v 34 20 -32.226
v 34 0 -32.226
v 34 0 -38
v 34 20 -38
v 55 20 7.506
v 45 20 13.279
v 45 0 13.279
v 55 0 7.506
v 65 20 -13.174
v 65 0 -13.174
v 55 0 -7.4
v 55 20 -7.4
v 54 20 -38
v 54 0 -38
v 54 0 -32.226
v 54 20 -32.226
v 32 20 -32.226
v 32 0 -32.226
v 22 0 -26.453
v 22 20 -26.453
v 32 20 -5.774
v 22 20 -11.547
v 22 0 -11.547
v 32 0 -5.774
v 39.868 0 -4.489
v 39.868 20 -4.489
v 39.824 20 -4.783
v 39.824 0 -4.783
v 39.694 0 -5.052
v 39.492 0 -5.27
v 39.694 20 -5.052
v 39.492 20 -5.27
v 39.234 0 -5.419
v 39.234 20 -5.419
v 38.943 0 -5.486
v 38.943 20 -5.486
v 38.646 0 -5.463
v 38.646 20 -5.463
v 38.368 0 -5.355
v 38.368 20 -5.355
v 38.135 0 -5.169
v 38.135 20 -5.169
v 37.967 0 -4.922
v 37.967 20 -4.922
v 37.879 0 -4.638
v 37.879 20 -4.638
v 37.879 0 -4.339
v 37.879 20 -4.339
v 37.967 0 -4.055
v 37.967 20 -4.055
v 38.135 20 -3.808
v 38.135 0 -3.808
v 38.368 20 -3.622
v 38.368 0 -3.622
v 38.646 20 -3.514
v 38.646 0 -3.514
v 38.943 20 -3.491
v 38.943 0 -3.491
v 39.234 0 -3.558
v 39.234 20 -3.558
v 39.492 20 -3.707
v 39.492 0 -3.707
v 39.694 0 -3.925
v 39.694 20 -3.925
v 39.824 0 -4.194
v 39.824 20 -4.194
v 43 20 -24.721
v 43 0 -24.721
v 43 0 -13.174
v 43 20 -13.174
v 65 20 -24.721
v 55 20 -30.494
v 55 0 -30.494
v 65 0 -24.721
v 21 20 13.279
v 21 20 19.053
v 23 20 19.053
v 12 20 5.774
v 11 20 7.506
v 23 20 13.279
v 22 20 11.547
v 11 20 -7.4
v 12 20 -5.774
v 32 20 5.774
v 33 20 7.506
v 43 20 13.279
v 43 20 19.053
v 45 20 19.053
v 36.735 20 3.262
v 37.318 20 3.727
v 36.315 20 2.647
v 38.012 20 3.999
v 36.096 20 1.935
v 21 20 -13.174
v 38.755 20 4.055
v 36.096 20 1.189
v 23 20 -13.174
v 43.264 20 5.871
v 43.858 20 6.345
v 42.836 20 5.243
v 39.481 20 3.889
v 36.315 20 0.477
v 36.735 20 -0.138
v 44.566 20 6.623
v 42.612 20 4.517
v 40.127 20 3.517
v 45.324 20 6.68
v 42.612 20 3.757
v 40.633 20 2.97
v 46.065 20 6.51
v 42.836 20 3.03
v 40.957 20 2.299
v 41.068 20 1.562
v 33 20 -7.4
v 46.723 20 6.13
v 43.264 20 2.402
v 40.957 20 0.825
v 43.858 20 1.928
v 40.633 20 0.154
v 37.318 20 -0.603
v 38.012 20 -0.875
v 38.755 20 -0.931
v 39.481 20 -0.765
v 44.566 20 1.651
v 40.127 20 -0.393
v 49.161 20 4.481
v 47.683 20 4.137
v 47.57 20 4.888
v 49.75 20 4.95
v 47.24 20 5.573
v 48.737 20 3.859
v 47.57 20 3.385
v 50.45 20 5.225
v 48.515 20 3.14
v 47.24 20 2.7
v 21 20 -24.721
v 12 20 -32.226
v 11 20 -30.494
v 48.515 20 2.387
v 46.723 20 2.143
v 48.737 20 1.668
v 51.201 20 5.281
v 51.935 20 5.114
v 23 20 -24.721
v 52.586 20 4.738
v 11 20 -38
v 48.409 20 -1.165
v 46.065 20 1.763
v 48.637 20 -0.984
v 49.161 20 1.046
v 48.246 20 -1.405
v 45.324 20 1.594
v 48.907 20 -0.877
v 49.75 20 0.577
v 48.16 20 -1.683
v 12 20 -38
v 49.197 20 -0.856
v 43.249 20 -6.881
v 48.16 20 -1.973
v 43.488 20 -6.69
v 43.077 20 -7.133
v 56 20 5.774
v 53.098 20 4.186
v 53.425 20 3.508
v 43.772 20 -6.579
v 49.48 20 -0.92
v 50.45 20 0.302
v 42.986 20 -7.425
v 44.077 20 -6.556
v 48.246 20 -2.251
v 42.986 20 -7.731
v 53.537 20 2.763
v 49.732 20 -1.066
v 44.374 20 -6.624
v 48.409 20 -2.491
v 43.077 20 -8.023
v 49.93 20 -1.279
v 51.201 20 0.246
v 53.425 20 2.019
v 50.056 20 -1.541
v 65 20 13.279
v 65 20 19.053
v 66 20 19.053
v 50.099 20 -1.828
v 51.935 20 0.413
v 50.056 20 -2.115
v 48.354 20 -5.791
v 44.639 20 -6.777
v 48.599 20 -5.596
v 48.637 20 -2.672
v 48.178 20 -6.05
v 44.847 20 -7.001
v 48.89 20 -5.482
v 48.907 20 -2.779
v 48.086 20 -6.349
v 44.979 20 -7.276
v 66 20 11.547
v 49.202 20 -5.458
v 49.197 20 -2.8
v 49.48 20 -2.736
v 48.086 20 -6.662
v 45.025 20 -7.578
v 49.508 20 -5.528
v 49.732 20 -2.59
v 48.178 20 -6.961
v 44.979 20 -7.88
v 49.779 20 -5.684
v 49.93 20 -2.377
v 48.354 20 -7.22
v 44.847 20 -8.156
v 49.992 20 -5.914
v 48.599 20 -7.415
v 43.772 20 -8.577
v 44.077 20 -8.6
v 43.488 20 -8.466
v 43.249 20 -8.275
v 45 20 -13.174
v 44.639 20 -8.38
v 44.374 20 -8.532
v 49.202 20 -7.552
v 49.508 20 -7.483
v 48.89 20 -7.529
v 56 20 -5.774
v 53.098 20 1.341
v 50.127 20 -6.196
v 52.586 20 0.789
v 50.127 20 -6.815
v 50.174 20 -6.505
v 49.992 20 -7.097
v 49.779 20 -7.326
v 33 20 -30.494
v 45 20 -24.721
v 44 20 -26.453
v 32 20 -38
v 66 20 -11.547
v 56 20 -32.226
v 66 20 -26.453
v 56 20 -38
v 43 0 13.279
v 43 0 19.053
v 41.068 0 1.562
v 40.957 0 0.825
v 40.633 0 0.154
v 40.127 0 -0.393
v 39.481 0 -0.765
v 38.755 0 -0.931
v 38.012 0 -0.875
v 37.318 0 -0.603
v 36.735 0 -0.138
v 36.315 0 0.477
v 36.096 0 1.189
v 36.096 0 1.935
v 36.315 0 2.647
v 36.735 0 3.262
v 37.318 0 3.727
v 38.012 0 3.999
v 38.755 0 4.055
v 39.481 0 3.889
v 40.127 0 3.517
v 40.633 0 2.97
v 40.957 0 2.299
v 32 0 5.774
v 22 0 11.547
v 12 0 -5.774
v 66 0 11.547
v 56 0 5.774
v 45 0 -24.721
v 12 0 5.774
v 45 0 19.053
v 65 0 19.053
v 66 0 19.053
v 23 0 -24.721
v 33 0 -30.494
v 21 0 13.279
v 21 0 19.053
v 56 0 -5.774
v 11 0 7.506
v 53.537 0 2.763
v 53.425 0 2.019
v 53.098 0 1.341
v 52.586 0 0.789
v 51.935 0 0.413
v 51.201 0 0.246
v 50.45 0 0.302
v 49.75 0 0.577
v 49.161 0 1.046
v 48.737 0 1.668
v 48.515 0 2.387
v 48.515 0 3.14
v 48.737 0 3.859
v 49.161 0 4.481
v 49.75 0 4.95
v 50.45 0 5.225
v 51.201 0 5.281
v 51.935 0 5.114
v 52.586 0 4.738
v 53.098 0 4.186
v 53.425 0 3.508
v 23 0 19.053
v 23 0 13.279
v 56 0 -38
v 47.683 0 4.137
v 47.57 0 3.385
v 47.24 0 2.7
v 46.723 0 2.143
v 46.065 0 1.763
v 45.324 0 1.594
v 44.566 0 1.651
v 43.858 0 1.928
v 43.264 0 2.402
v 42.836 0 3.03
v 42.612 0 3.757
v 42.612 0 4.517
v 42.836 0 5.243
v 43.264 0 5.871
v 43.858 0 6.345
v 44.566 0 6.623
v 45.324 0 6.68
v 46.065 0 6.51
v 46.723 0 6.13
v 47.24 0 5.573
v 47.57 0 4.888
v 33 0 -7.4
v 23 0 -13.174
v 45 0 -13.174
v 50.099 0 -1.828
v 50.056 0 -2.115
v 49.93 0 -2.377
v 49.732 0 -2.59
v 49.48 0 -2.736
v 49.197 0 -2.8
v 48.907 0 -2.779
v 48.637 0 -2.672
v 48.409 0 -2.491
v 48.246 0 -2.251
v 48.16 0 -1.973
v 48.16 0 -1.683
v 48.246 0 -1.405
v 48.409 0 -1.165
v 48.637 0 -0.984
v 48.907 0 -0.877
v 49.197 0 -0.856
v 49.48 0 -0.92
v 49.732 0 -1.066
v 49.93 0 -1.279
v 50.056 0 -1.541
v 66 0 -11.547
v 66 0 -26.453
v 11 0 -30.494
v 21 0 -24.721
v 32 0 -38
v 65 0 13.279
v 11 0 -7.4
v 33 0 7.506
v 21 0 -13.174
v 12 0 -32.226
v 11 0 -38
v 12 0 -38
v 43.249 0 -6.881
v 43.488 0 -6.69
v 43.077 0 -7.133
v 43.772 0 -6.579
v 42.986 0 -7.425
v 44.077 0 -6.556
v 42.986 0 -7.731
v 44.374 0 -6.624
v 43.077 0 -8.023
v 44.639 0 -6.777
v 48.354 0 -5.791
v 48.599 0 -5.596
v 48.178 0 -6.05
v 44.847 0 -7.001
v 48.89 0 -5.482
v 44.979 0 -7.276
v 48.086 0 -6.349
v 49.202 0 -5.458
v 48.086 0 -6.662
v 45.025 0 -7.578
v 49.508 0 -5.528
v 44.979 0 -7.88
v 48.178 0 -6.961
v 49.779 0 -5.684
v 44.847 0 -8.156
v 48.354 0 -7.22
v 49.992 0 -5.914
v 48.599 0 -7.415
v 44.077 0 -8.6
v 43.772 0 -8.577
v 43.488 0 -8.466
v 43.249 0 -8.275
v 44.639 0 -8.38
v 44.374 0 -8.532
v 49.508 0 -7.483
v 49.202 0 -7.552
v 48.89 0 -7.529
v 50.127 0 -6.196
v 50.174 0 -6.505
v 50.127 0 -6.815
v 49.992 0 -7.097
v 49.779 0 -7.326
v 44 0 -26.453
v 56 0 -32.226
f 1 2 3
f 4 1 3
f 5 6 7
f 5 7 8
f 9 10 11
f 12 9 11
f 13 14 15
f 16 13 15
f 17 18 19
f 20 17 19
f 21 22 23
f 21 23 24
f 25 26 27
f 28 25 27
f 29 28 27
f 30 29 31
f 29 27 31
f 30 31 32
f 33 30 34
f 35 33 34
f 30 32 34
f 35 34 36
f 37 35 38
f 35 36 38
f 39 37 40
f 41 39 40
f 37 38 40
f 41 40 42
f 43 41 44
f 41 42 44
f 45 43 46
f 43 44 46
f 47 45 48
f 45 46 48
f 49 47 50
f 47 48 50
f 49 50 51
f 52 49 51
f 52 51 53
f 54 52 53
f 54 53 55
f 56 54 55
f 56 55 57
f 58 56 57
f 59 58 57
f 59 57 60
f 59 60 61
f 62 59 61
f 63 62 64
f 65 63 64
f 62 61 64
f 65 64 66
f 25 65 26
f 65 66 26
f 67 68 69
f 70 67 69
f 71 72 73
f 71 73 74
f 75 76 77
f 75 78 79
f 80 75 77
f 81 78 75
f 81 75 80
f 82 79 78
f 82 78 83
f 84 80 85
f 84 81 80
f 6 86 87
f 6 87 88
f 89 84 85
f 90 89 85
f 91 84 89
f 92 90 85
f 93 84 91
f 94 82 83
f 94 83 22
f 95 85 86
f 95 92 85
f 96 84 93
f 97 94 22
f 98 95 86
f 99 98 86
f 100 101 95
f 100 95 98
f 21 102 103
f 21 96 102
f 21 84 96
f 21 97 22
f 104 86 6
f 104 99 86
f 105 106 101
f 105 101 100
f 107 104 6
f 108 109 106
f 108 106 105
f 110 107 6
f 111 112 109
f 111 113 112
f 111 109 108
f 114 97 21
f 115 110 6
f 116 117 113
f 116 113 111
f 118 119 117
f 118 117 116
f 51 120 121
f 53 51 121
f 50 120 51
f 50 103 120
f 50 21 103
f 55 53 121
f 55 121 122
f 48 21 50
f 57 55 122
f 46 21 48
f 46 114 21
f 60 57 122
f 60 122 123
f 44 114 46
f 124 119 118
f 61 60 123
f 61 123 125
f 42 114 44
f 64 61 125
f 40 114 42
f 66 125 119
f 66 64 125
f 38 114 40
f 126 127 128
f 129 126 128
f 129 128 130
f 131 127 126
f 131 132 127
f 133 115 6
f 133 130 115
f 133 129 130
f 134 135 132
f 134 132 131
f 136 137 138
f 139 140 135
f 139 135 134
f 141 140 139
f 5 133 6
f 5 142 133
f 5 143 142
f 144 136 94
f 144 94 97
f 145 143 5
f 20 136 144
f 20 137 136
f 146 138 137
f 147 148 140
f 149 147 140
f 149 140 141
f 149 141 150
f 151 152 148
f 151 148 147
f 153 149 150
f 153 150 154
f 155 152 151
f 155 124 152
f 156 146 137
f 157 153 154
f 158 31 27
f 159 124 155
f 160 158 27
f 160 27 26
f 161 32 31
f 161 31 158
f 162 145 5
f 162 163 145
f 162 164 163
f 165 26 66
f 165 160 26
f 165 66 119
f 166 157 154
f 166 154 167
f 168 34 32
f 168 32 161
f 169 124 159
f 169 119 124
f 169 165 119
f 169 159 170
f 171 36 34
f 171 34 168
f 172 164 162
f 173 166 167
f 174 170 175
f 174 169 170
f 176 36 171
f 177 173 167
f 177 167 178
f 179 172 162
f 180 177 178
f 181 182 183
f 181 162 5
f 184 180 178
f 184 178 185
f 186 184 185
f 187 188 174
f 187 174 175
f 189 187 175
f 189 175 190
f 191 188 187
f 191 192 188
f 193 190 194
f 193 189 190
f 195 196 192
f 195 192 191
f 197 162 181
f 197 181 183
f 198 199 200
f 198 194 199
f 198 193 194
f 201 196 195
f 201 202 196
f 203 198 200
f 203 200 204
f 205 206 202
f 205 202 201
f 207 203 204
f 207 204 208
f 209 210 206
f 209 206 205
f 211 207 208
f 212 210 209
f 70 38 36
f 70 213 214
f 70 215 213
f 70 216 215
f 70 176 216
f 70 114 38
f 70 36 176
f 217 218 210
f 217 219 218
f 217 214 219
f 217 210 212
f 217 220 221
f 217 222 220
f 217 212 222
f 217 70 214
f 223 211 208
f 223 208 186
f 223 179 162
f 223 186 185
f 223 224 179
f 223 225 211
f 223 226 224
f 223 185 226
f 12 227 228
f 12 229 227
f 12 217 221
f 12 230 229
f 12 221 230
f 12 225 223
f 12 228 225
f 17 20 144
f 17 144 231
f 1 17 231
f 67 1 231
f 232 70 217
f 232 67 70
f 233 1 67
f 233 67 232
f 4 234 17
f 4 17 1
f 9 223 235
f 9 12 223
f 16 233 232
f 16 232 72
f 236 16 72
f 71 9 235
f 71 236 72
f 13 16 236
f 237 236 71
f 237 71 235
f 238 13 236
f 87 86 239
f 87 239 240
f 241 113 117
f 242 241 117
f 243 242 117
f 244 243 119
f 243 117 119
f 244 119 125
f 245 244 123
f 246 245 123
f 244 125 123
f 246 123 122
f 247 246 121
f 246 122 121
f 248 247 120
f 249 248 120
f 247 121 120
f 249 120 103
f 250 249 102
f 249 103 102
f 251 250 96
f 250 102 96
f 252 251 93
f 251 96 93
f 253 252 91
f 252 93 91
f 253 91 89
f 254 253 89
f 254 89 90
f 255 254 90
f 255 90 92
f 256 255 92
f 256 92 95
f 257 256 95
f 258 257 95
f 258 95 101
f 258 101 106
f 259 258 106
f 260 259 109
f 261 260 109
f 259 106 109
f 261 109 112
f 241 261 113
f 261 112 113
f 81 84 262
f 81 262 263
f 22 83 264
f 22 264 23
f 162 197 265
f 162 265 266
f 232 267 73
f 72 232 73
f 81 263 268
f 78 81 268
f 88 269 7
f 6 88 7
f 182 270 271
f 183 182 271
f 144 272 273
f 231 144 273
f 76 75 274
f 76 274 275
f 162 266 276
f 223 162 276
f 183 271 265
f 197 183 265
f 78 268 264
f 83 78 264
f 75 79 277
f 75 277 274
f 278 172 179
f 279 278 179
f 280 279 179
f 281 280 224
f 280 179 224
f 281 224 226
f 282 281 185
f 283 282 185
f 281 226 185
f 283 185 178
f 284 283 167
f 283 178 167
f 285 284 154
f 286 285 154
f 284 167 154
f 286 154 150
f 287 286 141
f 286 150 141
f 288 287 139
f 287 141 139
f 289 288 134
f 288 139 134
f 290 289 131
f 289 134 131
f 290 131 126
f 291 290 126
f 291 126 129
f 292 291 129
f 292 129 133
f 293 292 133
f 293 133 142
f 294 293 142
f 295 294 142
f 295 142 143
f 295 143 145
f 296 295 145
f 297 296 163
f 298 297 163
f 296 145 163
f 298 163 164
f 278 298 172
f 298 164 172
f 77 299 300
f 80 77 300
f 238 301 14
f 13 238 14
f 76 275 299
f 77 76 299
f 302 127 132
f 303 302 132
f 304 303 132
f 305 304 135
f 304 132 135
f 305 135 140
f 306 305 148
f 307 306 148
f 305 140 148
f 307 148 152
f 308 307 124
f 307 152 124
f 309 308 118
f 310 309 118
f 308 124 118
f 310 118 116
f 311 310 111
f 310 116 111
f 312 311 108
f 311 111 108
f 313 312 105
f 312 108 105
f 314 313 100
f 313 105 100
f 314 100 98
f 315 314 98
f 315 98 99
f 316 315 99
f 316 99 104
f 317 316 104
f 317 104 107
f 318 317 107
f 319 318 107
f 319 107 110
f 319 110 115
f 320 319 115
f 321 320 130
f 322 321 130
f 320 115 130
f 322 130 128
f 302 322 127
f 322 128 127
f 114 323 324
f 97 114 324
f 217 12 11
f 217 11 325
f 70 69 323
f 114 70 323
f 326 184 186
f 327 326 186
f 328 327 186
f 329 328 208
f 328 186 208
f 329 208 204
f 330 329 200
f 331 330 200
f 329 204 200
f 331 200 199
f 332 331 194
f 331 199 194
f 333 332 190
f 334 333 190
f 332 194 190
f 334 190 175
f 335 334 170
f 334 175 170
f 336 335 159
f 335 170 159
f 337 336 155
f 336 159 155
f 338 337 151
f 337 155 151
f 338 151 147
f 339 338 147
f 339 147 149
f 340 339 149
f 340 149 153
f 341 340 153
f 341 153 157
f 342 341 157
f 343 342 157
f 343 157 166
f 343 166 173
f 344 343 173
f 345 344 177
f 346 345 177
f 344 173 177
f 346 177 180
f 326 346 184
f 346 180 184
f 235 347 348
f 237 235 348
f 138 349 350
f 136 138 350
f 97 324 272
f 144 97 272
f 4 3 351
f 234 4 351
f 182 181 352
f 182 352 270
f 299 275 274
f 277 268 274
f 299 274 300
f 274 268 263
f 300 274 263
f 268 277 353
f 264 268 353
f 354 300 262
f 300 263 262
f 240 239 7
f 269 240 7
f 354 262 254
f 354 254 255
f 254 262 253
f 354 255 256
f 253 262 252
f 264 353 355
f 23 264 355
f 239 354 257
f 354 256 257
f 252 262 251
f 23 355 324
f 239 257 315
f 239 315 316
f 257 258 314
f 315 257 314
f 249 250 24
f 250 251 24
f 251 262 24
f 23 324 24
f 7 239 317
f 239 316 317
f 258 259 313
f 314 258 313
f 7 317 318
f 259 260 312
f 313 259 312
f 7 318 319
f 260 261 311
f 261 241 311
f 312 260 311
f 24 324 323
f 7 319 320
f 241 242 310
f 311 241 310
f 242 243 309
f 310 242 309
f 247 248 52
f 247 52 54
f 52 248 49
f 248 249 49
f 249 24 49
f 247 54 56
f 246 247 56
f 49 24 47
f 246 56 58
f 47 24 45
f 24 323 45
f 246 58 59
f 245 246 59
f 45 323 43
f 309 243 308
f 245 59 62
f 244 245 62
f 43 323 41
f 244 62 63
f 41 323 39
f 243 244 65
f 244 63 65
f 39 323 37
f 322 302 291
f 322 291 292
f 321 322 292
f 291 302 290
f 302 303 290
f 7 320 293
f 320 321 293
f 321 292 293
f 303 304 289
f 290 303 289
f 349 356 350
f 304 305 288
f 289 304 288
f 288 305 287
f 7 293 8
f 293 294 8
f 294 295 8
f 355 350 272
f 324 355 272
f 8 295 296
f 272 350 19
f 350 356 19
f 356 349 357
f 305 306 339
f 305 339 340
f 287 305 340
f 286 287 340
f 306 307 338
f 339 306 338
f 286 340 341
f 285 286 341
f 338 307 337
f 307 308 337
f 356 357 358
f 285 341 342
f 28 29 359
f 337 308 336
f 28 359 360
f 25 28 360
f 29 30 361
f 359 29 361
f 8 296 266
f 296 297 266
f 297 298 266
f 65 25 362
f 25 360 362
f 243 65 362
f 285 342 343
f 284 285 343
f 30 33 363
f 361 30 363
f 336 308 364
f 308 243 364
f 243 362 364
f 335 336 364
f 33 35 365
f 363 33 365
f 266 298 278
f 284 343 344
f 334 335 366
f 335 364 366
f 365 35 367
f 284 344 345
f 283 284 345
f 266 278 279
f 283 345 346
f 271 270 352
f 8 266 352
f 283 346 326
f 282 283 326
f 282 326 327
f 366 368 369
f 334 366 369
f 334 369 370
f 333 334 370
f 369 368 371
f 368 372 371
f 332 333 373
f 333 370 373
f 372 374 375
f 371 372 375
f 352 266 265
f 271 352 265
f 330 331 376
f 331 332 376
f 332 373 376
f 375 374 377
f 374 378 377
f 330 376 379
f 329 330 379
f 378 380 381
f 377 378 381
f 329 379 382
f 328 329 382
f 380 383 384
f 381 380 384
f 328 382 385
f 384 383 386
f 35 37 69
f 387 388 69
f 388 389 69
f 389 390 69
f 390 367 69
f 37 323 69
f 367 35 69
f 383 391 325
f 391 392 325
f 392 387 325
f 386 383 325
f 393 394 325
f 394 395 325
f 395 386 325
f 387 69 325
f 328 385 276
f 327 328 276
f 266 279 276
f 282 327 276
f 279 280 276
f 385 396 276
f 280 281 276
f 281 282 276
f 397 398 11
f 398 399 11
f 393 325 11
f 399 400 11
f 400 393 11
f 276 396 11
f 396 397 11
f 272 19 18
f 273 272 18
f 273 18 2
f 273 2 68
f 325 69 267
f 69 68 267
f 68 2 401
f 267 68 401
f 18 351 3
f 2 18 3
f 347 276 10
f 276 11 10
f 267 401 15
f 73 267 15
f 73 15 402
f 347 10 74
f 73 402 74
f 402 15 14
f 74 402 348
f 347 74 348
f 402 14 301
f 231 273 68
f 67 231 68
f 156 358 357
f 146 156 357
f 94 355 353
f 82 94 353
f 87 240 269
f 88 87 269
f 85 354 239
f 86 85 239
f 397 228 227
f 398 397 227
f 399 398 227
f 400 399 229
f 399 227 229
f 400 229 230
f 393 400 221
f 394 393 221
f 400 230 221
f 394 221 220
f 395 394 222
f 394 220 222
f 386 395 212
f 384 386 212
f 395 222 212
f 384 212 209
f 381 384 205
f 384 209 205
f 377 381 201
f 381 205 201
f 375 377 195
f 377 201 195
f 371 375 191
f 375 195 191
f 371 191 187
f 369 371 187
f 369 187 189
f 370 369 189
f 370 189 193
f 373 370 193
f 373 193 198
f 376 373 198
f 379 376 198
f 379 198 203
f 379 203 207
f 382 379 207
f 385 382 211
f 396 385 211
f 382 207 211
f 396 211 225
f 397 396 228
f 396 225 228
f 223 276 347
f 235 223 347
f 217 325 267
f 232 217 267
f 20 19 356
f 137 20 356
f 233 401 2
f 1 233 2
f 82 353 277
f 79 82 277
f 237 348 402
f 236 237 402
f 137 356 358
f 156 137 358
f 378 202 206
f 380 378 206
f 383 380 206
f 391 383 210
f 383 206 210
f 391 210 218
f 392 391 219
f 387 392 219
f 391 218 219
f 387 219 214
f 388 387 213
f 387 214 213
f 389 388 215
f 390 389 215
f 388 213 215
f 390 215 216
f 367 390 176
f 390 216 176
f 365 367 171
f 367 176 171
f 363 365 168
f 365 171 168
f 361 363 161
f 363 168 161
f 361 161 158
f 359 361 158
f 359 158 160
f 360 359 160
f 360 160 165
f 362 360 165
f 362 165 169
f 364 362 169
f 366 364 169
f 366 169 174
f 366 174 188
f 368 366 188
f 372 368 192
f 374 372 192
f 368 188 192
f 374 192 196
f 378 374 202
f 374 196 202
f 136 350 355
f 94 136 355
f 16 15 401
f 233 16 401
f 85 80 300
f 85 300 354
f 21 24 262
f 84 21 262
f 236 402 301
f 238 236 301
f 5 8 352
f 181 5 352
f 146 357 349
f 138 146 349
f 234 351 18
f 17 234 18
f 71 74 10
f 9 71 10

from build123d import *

# Parameters (mm, degrees)
BOSS_EXTRUDE2_DEPTH = 20
SKETCH2_R           = 1.025
SKETCH2_R_2         = 1.05
SKETCH2_R_3         = 0.975
SKETCH2_R_4         = 1
SKETCH2_R_5         = 2.5
SKETCH2_R_6         = 2.55
SKETCH2_R_7         = 2.525
BOSS_EXTRUDE3_DEPTH = 20


with BuildPart() as part:
    # Sketch1 → Boss-Extrude2 (new body)
    with BuildSketch(Plane(origin=(0, 0, 0), x_dir=(1, 0, 0), z_dir=(0, 1, 0))):
        Polygon((21, -13.279056191), (21, -19.052558883), (23, -19.052558883), (23, -13.279056191), (33, -7.505553499), (43, -13.279056191), (43, -19.052558883), (45, -19.052558883), (45, -13.279056191), (55, -7.505553499), (65, -13.279056191), (65, -19.052558883), (66, -19.052558883), (66, -11.547005384), (56, -5.773502692), (56, 5.773502692), (66, 11.547005384), (66, 26.452994616), (56, 32.226497308), (56, 38), (54, 38), (54, 32.226497308), (44, 26.452994616), (34, 32.226497308), (34, 38), (32, 38), (32, 32.226497308), (22, 26.452994616), (12, 32.226497308), (12, 38), (11, 38), (11, 30.494446501), (21, 24.720943809), (21, 13.173938425), (11, 7.400435733), (11, -7.505553499), align=None)
        Polygon((12, 5.773502692), (22, 11.547005384), (32, 5.773502692), (32, -5.773502692), (22, -11.547005384), (12, -5.773502692), align=None, mode=Mode.SUBTRACT)
        Polygon((34, 5.773502692), (44, 11.547005384), (54, 5.773502692), (54, -5.773502692), (44, -11.547005384), (34, -5.773502692), align=None, mode=Mode.SUBTRACT)
        Polygon((43, 13.173938425), (33, 7.400435733), (23, 13.173938425), (23, 24.720943809), (33, 30.494446501), (43, 24.720943809), align=None, mode=Mode.SUBTRACT)
        Polygon((65, 13.173938425), (55, 7.400435733), (45, 13.173938425), (45, 24.720943809), (55, 30.494446501), (65, 24.720943809), align=None, mode=Mode.SUBTRACT)
    extrude(amount=BOSS_EXTRUDE2_DEPTH)

    # Sketch2 → Boss-Extrude3 (add, through all)
    with BuildSketch(Plane(origin=(0, 20, 0), x_dir=(1, 0, 0), z_dir=(0, 1, 0))):
        Polygon((44, 11.547005384), (34, 5.773502692), (34, -5.773502692), (44, -11.547005384), (54, -5.773502692), (54, 5.773502692), align=None)
        with Locations((44, 7.57813322)):
            Circle(SKETCH2_R, mode=Mode.SUBTRACT)
        with Locations((49.12400919, 6.50535)):
            Circle(SKETCH2_R_2, mode=Mode.SUBTRACT)
        with Locations((49.12400919, 1.82801516)):
            Circle(SKETCH2_R_3, mode=Mode.SUBTRACT)
        with Locations((38.868201604, 4.488517546)):
            Circle(SKETCH2_R_4, mode=Mode.SUBTRACT)
        with Locations((38.567822302, -1.561979816)):
            Circle(SKETCH2_R_5, mode=Mode.SUBTRACT)
        with Locations((45.13325561, -4.136659545)):
            Circle(SKETCH2_R_6, mode=Mode.SUBTRACT)
        with Locations((51.012107657, -2.763497023)):
            Circle(SKETCH2_R_7, mode=Mode.SUBTRACT)
    extrude(amount=-BOSS_EXTRUDE3_DEPTH)


solid = part.part
